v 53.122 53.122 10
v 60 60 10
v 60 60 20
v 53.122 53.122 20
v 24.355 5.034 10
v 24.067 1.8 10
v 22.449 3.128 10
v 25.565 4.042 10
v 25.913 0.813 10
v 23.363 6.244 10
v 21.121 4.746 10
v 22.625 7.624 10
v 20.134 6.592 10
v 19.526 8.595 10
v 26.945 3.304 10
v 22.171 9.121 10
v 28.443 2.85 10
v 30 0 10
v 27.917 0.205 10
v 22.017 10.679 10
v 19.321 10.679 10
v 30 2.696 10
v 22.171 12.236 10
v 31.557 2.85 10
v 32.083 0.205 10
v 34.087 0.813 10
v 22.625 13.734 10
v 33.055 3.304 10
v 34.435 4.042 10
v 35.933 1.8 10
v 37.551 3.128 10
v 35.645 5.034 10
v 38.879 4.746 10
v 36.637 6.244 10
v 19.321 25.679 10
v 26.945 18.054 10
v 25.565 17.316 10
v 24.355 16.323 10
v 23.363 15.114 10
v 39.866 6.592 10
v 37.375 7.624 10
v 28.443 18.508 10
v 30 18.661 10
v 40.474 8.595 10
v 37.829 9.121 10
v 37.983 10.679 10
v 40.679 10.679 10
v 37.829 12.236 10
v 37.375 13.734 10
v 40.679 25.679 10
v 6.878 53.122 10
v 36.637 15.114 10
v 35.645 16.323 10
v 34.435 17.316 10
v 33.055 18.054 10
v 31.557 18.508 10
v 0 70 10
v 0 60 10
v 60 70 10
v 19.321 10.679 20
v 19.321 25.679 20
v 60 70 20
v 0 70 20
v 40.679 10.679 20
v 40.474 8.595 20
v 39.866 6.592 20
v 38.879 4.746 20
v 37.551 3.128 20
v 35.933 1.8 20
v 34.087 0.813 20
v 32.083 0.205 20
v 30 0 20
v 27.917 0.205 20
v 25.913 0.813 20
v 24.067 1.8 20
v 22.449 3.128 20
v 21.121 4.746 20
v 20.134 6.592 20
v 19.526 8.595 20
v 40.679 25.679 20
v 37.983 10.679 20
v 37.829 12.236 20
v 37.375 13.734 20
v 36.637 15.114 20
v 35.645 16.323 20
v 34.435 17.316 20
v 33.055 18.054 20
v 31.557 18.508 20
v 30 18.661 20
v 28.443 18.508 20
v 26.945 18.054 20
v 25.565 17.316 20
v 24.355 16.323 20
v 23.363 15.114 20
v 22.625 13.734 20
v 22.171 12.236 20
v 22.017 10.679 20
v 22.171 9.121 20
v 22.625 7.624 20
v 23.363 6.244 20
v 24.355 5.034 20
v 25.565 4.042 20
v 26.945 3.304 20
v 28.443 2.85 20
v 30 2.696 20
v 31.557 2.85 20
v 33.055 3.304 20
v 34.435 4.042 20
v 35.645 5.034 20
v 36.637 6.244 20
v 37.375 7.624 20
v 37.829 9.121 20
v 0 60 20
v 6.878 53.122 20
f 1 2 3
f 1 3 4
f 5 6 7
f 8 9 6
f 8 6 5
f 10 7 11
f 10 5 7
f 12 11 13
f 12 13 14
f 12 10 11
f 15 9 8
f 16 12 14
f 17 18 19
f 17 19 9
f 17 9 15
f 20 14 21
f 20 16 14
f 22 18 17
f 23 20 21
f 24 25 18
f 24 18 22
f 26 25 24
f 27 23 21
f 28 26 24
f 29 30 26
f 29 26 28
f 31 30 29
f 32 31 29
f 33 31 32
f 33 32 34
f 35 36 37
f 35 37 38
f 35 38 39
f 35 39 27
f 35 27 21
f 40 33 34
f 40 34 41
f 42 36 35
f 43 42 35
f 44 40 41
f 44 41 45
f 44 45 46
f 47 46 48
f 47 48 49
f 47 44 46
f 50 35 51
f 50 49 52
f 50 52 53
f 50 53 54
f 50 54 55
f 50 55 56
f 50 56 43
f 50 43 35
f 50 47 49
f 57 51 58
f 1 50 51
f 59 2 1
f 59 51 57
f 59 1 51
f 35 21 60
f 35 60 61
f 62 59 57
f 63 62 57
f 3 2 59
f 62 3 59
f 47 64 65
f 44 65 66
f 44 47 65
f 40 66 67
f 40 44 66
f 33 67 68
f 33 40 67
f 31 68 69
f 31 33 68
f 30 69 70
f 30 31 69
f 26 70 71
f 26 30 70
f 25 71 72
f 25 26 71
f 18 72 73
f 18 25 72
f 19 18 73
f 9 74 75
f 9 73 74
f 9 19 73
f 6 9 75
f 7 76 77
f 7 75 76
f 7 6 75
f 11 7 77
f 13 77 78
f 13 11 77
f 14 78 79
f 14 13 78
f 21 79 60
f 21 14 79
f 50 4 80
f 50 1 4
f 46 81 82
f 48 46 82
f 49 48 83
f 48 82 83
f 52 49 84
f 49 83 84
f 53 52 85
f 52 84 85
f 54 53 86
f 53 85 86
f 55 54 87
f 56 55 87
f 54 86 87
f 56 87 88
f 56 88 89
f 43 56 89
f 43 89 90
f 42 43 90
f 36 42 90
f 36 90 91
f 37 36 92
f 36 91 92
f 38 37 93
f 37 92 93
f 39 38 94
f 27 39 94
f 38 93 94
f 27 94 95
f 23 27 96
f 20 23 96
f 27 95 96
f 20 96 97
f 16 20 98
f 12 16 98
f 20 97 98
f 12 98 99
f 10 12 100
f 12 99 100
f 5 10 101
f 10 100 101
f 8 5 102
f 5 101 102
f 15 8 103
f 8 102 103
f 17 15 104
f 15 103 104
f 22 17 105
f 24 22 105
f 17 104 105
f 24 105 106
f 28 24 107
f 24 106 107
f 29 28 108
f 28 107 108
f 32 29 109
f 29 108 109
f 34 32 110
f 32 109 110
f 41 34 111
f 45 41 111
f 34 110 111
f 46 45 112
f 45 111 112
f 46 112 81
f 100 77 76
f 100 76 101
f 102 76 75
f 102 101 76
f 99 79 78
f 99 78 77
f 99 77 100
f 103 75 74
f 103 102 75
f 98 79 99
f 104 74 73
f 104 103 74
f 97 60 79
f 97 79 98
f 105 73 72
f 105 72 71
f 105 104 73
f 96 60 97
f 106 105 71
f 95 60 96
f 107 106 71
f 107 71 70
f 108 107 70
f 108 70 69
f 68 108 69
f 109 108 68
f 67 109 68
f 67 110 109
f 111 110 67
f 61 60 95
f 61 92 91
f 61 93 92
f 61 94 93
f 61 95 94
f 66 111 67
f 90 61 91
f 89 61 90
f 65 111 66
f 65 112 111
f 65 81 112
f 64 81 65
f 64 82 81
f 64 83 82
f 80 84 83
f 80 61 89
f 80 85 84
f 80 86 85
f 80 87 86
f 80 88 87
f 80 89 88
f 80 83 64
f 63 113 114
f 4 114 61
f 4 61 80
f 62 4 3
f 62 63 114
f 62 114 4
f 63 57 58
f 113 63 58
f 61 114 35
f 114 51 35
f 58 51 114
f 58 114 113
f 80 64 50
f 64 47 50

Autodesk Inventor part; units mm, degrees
ref_plane "YZ Plane" through (0, 0, 0) normal (1, 0, 0) x (0, 1, 0)
ref_plane "XZ Plane" through (0, 0, 0) normal (0, 1, 0) x (-1, 0, 0)
ref_plane "XY Plane" through (0, 0, 0) normal (0, 0, 1) x (1, 0, 0)
sketch "Sketch1" plane through (0, 0, 0) normal (0, 0, 1) x (1, 0, 0)
  line L0 (0, 0) -> (60, 0)
  line L1 (60, 0) -> (60, 70)
  line L2 (60, 70) -> (0, 70)
  line L3 (0, 70) -> (0, 0)
  dimension "d0" = 60
  dimension "d1" = 70
extrude "Extrusion1" add sketch "Sketch1" along normal blind 10
sketch "Sketch2" plane through (0, 0, 10) normal (0, 0, 1) x (1, 0, 0)
  line L0 (0, 60) -> (60, 60) construction
  line L1 (60, 0) -> (60, 70) construction
  line L2 (0, 60) -> (60, 0) construction
  line L3 (0, 0) -> (60, 0) construction
  line L4 (60, 60) -> (0, 0) construction
  arc A0 (0, 0) -> (0, 60) centre (-23.1222, 30) ccw construction
  arc A1 (60, 60) -> (60, 0) centre (83.1222, 30) ccw construction
  line L5 (60, 70) -> (0, 70) construction
  line L6 (30, 70) -> (30, 0) construction
  line L7 (17.3619, 30) -> (14.7544, 30) construction
  line L8 (42.6381, 30) -> (45.2456, 30) construction
  line L9 (0, 60) -> (60, 60)
  circle A2 centre (30, 10.6788) radius 10.6788
  line L10 (19.3212, 10.6788) -> (19.3212, 25.6788)
  line L11 (6.8778, 53.1222) -> (0, 60)
  line L12 (40.6788, 10.6788) -> (40.6788, 25.6788)
  line L13 (60, 60) -> (53.1222, 53.1222)
  line L14 (6.8778, 53.1222) -> (19.3212, 25.6788)
  line L15 (53.1222, 53.1222) -> (40.6788, 25.6788)
  line L16 (0, 70) -> (0, 0) projected
  line L17 (0, 60) -> (0, 70)
  line L18 (0, 70) -> (60, 70)
  line L19 (60, 70) -> (60, 60)
  line L20 (40.6788, 25.6788) -> (19.3212, 25.6788)
  line L21 (53.1222, 53.1222) -> (6.8778, 53.1222)
  line L22 (6.8778, 53.1222) -> (0, 60)
  line L23 (53.1222, 53.1222) -> (60, 60)
  line L24 (0, 70) -> (0, 0) projected
  line L25 (0, 60) -> (0, 70)
  line L26 (0, 70) -> (60, 70)
  line L27 (60, 60) -> (60, 70)
  dimension "d4" = 10
extrude "Extrusion2" add sketch "Sketch2" along normal blind 10
sketch "Sketch3" plane through (60, 0, 0) normal (1, 0, 0) x (0, 0, -1)
  line L0 (-10, 60) -> (-20, 60) projected
  line L1 (-10, 60) -> (-10, 70)
  line L2 (0, 70) -> (-20, 70) projected
  line L3 (0, 0) -> (-10, 0) projected
  line L4 (-10, 0) -> (0, 0)
  line L5 (-10, 60) -> (-10, 0)
  line L6 (-10, 0) -> (-10, 60) projected
  line L7 (0, 0) -> (0, 70) projected
  line L8 (-10, 0) -> (0, 0)
  line L9 (0, 0) -> (0, 70)
  line L10 (0, 70) -> (-10, 70)
extrude "Extrusion3" cut sketch "Sketch3" against normal through all
sketch "Sketch4" plane through (0, 0, 20) normal (0, 0, 1) x (1, 0, 0)
  arc A0 (19.3212, 10.6788) -> (40.6788, 10.6788) centre (30, 10.6788) ccw construction
  line L0 (30, 10.6788) -> (30, 0) construction
  line L1 (60, 70) -> (0, 70) construction
  line L2 (30, 70) -> (30, 10.6788) construction
  circle A1 centre (30, 10.6788) radius 7.9826 construction
  circle A2 centre (30, 10.6788) radius 7.9826
  point P0 (0, 0)
extrude "Extrusion4" cut sketch "Sketch4" against normal blind 10
properties part number "Wheel Holder"
